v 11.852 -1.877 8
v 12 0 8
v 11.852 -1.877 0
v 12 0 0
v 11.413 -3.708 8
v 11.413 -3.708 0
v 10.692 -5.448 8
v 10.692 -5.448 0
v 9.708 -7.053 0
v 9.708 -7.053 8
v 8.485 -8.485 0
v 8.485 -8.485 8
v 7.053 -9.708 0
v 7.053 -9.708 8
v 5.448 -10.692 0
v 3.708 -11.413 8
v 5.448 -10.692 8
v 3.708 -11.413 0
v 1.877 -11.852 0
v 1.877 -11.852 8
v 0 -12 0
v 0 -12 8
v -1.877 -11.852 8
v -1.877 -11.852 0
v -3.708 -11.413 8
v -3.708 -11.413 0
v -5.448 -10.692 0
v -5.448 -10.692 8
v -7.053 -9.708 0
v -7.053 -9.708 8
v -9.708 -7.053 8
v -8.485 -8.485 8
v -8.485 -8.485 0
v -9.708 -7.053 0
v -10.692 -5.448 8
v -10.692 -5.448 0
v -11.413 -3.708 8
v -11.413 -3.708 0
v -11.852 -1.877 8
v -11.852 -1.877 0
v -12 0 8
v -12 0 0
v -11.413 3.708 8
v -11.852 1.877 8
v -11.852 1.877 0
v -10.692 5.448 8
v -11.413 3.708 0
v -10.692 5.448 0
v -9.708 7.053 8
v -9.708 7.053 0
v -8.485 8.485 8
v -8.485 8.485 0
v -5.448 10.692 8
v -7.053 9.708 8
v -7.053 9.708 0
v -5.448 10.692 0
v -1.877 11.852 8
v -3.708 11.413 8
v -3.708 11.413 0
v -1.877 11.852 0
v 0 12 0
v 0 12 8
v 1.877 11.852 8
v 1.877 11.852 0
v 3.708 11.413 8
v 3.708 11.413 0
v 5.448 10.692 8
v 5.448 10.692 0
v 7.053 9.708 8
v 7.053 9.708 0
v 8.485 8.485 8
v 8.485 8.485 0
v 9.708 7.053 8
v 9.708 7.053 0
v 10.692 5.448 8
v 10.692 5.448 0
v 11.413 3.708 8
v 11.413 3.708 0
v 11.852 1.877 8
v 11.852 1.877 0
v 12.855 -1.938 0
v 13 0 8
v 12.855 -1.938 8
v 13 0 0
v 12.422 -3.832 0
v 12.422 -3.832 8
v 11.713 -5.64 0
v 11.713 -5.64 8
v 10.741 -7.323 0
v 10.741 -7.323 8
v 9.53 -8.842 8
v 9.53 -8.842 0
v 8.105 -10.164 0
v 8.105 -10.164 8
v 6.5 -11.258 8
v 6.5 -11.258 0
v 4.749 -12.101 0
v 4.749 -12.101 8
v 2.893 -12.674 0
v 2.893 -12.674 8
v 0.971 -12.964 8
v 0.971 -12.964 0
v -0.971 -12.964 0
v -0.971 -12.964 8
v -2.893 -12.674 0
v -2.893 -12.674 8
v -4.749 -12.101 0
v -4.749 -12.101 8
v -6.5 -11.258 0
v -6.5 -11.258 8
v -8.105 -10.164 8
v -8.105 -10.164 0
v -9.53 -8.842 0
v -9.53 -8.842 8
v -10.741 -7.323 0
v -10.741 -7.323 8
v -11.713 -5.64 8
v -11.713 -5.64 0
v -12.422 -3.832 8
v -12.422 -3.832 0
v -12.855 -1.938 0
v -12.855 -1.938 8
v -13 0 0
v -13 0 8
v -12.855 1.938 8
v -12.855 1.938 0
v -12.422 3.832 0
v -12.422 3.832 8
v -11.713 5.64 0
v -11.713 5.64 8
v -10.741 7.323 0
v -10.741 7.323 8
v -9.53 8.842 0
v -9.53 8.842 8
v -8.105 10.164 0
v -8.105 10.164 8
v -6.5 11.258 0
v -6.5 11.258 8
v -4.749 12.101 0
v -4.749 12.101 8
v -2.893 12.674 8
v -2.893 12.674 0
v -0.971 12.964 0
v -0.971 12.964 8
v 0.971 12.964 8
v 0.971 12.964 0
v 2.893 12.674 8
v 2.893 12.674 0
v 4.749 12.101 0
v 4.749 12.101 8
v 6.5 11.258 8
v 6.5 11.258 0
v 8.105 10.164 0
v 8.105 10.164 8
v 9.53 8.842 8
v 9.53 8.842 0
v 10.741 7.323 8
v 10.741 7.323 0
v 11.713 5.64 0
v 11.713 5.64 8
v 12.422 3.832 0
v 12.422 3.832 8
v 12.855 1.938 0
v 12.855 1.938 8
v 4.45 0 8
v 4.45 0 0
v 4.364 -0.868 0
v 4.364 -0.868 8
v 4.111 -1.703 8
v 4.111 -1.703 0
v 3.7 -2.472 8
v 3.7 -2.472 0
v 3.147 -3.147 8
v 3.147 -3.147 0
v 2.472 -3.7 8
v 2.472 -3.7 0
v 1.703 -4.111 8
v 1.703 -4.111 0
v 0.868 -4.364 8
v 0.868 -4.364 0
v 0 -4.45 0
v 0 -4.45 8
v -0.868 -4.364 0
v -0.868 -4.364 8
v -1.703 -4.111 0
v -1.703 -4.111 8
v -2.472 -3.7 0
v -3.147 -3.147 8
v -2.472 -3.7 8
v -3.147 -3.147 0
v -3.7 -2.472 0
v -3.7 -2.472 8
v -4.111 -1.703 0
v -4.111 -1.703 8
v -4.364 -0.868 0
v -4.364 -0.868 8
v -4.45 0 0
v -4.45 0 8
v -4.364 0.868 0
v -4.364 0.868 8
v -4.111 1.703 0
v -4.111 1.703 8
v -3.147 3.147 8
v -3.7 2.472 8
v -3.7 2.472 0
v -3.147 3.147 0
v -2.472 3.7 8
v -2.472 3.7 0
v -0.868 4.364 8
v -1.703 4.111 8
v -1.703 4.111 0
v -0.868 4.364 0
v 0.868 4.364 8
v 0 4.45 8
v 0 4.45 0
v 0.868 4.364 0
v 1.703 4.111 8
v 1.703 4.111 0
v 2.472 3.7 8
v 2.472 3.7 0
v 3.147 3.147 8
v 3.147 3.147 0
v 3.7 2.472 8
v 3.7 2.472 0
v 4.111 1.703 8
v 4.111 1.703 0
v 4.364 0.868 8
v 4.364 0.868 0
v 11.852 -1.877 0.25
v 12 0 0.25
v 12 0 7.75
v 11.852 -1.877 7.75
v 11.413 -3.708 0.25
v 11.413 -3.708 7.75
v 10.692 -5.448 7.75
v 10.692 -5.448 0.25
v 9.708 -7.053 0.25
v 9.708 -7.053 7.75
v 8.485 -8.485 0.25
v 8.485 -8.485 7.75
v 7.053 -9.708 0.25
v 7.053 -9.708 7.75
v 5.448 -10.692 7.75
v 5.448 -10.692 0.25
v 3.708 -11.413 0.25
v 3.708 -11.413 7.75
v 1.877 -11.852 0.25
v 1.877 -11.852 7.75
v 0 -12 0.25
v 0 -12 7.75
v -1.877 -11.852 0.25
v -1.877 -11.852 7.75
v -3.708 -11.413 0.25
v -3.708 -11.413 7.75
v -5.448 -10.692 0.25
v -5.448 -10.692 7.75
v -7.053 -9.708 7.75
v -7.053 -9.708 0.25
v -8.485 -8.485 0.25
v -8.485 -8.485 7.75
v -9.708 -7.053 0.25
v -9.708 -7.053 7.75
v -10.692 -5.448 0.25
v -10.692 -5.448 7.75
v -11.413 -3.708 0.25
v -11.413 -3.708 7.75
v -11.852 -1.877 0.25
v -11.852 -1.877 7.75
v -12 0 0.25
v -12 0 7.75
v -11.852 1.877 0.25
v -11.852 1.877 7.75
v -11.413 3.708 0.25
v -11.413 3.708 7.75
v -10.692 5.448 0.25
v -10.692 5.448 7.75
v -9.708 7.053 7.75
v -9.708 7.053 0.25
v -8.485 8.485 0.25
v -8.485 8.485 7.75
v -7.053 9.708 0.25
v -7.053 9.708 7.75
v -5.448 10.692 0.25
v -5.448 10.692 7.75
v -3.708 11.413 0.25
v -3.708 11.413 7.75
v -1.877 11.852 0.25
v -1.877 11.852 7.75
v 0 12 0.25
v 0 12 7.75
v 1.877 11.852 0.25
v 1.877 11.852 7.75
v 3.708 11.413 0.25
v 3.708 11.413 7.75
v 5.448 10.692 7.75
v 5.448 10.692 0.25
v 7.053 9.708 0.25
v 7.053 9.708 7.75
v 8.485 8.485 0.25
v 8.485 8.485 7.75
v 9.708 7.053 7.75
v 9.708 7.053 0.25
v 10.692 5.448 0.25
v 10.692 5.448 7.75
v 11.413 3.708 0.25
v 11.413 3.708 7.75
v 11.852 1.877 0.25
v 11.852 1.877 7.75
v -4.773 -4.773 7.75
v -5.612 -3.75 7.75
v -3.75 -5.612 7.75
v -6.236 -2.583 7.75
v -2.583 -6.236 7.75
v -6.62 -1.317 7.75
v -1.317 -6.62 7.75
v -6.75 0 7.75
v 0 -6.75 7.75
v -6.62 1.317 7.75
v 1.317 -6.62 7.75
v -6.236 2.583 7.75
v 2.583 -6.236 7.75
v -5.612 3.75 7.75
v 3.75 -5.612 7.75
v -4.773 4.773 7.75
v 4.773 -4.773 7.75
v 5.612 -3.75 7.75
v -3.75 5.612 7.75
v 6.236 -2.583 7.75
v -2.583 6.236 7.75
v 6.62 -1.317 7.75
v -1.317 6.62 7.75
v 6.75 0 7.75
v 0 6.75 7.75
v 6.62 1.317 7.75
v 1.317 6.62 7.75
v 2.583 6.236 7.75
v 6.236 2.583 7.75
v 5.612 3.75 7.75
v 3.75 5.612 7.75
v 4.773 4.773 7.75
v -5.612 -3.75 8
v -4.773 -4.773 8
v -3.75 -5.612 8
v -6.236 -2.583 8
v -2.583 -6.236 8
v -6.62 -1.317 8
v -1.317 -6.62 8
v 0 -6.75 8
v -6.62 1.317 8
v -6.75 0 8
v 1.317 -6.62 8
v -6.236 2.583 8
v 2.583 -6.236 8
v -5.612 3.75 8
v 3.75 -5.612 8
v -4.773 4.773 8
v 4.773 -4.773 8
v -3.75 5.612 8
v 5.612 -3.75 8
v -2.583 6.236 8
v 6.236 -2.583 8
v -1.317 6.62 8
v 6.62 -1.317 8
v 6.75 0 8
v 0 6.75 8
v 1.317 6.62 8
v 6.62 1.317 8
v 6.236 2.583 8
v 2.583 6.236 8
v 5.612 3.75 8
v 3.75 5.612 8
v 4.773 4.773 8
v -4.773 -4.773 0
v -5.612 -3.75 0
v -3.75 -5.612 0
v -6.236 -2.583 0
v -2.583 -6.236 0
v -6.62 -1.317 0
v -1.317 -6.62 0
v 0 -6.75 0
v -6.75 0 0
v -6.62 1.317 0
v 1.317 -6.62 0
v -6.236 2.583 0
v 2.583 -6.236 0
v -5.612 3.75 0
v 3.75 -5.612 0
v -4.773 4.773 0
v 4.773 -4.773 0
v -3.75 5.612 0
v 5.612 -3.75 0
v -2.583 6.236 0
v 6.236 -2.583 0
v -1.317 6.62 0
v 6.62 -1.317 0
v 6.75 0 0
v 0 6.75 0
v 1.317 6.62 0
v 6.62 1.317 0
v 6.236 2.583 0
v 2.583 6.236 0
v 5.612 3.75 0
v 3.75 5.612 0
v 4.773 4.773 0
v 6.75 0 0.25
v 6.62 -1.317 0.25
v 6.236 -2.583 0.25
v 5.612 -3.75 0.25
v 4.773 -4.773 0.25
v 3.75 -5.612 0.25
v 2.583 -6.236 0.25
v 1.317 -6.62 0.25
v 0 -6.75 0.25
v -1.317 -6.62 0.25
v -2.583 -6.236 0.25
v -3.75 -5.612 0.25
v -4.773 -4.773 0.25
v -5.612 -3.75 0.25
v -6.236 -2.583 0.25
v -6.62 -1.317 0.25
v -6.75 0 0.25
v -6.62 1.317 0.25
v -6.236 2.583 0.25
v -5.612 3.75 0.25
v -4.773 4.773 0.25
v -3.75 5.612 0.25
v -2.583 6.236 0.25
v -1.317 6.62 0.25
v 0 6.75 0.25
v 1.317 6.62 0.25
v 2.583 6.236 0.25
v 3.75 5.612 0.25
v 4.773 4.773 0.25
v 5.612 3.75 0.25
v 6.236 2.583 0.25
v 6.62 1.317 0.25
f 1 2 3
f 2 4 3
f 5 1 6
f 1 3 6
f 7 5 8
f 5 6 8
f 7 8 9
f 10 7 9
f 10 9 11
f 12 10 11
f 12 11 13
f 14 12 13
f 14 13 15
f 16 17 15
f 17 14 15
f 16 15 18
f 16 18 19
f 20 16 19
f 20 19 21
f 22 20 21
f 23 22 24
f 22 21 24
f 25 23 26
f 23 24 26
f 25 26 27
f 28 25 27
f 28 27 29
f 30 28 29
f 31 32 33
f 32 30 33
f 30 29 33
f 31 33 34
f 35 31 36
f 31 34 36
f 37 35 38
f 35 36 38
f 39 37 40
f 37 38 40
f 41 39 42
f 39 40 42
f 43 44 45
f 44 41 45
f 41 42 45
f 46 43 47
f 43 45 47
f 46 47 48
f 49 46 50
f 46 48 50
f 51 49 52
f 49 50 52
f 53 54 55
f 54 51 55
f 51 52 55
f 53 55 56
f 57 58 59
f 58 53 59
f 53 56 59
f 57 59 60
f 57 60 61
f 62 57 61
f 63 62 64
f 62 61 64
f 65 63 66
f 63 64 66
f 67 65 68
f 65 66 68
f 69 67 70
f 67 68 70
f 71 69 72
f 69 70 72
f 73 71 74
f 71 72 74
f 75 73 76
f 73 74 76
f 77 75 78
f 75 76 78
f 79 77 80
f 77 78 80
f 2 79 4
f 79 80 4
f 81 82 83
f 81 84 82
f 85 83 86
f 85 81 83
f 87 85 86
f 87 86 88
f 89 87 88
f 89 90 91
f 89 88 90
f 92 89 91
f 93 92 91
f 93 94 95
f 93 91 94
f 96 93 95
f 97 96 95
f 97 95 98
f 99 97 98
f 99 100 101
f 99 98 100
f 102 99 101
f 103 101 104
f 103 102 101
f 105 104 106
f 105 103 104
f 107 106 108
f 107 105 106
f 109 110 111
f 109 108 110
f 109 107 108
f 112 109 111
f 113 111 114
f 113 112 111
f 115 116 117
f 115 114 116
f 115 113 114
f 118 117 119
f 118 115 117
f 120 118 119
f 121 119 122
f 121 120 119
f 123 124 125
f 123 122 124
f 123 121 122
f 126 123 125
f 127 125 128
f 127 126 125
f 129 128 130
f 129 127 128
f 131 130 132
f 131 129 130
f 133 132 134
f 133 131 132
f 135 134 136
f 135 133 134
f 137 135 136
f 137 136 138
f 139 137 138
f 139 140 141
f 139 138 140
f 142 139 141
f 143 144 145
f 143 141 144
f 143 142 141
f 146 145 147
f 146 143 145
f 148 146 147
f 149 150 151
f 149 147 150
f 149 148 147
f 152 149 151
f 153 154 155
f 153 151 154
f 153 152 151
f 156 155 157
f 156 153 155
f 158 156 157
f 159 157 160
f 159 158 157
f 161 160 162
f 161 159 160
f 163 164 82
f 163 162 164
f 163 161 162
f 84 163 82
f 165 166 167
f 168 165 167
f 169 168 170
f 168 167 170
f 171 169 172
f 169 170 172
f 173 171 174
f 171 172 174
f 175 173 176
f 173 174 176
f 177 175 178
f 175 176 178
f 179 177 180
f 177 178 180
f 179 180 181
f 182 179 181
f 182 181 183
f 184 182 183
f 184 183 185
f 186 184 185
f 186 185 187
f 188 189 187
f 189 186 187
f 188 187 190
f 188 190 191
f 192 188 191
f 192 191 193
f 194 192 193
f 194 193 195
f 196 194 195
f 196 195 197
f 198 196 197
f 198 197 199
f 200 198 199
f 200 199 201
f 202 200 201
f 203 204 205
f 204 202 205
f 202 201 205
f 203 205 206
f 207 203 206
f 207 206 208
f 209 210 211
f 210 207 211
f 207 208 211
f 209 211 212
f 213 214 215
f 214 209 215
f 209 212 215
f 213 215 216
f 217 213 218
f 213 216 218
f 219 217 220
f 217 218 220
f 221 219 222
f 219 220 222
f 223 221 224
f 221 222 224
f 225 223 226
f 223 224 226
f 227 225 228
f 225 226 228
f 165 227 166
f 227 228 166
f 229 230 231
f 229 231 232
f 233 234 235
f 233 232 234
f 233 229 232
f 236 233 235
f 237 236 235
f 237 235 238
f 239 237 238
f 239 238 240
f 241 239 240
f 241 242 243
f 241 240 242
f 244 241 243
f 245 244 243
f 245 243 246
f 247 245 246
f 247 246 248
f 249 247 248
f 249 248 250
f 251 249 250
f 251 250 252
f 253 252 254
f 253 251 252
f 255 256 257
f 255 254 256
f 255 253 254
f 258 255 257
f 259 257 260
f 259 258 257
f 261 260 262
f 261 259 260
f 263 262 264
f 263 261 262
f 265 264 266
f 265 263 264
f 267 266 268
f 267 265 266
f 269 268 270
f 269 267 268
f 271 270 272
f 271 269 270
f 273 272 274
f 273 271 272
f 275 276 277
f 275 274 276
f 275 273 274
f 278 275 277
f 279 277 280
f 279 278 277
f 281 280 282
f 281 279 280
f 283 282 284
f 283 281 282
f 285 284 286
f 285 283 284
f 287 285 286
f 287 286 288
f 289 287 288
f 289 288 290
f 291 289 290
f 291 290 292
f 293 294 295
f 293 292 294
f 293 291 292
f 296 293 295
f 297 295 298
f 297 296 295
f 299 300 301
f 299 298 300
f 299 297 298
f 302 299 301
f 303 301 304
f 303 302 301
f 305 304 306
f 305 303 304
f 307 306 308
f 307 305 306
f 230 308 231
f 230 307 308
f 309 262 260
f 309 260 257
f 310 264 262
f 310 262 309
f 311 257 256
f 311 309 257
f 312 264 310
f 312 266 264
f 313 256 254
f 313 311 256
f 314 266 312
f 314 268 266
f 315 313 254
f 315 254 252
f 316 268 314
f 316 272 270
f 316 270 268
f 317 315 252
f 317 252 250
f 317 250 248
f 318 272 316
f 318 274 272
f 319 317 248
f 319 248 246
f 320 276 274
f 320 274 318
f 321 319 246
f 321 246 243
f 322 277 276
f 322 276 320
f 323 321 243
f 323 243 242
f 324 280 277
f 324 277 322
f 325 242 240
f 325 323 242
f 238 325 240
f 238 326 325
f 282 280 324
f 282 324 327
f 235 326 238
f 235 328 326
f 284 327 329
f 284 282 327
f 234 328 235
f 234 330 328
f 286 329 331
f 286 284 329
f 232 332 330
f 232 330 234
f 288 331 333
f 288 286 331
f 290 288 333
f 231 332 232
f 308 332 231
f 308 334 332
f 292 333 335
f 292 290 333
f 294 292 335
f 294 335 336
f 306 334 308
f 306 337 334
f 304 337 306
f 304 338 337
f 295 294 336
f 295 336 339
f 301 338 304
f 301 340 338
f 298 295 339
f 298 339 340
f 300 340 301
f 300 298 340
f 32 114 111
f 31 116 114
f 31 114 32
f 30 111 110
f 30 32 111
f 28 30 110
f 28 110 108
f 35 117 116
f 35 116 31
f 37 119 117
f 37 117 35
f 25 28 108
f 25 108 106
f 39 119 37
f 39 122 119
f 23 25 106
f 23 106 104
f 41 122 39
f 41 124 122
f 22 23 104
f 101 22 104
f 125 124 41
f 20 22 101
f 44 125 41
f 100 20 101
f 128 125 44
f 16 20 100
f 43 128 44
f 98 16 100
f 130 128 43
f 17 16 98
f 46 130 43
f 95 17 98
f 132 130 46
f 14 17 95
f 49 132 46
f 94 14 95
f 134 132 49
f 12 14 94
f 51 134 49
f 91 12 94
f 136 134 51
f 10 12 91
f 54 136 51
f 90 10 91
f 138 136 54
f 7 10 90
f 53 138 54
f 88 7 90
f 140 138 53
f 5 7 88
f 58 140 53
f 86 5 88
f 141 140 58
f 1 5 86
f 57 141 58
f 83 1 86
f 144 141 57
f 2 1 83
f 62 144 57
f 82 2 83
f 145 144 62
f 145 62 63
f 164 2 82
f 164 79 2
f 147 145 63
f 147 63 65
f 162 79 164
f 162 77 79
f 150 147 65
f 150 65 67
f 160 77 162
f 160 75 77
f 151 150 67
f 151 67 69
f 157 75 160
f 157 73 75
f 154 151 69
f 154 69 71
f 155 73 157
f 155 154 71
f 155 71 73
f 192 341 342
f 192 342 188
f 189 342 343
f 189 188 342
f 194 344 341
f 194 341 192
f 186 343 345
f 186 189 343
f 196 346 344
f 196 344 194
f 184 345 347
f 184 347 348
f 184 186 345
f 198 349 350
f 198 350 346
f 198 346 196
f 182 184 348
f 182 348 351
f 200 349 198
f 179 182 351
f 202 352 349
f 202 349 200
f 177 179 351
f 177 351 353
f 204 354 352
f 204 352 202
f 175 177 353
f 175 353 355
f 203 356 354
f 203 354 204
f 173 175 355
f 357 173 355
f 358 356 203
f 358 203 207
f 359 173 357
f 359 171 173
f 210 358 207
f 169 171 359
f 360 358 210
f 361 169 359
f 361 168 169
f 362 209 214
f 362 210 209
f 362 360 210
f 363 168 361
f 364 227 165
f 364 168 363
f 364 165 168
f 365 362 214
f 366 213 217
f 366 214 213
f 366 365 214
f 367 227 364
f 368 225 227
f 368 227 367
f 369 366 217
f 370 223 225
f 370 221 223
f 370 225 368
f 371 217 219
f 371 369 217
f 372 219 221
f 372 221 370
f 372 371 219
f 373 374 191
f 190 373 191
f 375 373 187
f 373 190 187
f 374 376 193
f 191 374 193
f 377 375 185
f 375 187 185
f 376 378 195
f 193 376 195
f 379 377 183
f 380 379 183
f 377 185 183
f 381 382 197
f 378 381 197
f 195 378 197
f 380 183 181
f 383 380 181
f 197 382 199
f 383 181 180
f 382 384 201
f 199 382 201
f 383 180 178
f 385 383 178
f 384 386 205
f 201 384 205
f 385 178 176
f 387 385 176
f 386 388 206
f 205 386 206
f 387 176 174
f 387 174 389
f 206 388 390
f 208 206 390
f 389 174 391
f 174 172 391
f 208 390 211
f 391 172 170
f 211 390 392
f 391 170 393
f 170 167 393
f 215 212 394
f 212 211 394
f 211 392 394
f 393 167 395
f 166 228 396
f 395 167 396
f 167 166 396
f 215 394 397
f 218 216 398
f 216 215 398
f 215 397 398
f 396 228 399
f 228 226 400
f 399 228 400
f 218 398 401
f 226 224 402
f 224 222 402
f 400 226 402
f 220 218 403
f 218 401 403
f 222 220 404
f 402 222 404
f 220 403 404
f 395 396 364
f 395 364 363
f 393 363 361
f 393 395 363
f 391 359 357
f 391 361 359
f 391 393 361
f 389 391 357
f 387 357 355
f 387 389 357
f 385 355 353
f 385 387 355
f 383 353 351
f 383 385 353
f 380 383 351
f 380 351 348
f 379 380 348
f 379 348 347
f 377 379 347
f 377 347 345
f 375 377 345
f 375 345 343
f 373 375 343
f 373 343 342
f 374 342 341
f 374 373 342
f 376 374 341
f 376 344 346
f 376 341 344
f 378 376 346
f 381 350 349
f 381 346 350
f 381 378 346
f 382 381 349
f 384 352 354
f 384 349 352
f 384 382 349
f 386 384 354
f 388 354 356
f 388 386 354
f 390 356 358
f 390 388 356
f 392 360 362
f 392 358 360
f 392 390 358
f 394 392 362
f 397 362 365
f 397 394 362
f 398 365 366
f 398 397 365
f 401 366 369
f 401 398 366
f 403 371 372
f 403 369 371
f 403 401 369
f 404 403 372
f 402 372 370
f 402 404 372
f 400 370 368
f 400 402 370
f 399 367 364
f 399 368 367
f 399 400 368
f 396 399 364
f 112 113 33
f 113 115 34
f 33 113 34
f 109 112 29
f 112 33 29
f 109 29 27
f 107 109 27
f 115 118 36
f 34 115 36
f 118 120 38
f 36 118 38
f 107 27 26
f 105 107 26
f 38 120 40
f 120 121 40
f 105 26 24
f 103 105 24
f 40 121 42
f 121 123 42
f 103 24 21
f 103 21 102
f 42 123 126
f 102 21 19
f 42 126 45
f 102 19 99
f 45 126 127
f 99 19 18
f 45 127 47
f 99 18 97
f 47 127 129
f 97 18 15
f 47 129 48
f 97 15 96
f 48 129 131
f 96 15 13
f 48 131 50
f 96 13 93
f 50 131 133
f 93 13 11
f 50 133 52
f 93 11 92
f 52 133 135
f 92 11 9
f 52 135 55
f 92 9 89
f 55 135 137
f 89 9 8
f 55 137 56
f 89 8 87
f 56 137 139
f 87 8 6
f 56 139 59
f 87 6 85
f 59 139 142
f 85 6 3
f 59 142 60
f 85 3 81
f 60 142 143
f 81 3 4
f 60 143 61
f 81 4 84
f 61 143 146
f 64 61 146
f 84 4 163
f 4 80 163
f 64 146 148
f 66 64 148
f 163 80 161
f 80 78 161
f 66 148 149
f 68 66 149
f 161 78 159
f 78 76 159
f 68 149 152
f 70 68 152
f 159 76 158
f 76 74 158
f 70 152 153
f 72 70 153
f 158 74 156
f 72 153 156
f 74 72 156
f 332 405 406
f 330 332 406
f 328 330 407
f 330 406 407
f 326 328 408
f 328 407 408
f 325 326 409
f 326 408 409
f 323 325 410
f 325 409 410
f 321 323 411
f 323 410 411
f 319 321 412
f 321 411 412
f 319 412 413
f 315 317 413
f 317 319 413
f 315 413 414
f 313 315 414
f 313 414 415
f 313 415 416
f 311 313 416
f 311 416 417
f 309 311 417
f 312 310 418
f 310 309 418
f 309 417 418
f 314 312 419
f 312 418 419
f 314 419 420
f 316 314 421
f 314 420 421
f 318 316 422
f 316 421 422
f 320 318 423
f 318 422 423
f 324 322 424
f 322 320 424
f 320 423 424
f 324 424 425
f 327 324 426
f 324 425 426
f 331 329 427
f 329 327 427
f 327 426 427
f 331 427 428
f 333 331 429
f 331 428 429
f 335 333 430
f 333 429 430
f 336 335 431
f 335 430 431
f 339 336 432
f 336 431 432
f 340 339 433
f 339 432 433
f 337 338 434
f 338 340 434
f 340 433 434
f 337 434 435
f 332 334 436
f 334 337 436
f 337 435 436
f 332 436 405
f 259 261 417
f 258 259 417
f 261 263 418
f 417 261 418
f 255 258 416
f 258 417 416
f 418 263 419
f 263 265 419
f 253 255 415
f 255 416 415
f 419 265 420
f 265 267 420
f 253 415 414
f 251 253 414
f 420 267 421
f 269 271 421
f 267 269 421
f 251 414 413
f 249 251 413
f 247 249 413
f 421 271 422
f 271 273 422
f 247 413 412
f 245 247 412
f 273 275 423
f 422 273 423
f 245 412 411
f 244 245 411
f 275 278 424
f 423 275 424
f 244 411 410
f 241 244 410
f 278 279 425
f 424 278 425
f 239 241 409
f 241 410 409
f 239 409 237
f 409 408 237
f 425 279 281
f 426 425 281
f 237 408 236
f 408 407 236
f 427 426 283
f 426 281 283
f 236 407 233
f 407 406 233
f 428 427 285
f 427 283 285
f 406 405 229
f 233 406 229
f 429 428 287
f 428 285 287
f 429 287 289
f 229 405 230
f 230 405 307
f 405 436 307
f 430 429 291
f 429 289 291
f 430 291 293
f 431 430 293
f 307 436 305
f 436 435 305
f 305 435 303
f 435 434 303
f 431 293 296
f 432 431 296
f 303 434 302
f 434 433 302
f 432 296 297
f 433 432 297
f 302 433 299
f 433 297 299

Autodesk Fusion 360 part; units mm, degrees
sketch "main" plane through (0, 0, 0) normal (0, 0, 1) x (1, 0, 0) in component "bearing"
  circle A0 centre (0, 0) radius 13
  circle A1 centre (0, 0) radius 12
  circle A2 centre (0, 0) radius 4.45
  circle A3 centre (0, 0) radius 6.75
  dimension "d1" = 26
  dimension "d2" = 24
  dimension "d3" = 8.9
  dimension "d4" = 13.5
extrude "Extrude1" add sketch "main" along normal blind 8 makes body 1 at (12.9838, -0.648, 5.3333) makes body 2 at (6.7416, -0.3365, 5.3333) in component "bearing"
extrude "Extrude2" add sketch "main" along normal blind 7.5 from surface at 0.25 separate body contours A1 makes body 3 in component "bearing"
component "bearing" placed x (1, 0, 0) y (0, 1, 0) z (0, 0, 1) at (0, 0, 0)
equation "d2 = 26 mm - 2 mm"
equation "d8 = 8 mm - 0.5 mm"
